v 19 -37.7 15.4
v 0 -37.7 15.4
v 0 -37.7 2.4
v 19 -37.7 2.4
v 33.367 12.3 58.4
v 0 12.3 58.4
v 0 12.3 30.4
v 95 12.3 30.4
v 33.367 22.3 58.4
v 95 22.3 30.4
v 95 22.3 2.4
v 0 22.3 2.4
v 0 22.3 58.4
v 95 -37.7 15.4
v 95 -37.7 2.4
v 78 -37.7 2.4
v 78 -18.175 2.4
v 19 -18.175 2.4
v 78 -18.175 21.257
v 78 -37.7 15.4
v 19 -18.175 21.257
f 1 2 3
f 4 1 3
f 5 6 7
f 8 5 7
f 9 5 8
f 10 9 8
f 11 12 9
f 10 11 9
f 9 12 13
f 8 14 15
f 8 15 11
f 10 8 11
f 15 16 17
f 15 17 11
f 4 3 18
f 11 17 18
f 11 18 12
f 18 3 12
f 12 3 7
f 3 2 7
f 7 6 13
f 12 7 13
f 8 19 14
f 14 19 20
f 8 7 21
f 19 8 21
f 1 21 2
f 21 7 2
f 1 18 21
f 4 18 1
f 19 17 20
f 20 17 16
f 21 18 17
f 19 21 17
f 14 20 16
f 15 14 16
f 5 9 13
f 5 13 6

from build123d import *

# Parameters (mm, degrees)
F1_DEPTH = 95
F4_DEPTH = 25
F3_W     = 59
F3_H     = 19.5249739359
F5_DEPTH = 25


# Not quite as in the source:
# - a feature names something its author has since deleted; it is built from what else it names


with BuildPart() as f1:
    # F0 (on Right) → F1 (new body)
    with BuildSketch(Plane.YZ):
        Polygon((-37.6999974251, 2.400000114), (22.3000025749, 2.400000114), (22.3000025749, 58.400000114), (12.3000025749, 58.400000114), (12.3000025749, 30.400000114), (-37.6999974251, 15.400000114), align=None)
    extrude(amount=F1_DEPTH)

    # F2 (on face) → F4 (cut)
    with BuildSketch(Plane.XZ.offset(-12.3000025749)):
        Polygon((95, 58.400000114), (33.3666242659, 58.400000114), (95, 30.400000114), align=None)
    extrude(amount=-F4_DEPTH, mode=Mode.SUBTRACT)

    # F3 (on face) → F5 (cut)
    with BuildSketch(Plane(origin=(0, 0, 2.400000114), x_dir=(1, 0, 0), z_dir=(0, 0, -1))):
        with Locations((48.5, 27.9375104571)):
            Rectangle(F3_W, F3_H)
    extrude(amount=-F5_DEPTH, mode=Mode.SUBTRACT)


solid = f1.part
